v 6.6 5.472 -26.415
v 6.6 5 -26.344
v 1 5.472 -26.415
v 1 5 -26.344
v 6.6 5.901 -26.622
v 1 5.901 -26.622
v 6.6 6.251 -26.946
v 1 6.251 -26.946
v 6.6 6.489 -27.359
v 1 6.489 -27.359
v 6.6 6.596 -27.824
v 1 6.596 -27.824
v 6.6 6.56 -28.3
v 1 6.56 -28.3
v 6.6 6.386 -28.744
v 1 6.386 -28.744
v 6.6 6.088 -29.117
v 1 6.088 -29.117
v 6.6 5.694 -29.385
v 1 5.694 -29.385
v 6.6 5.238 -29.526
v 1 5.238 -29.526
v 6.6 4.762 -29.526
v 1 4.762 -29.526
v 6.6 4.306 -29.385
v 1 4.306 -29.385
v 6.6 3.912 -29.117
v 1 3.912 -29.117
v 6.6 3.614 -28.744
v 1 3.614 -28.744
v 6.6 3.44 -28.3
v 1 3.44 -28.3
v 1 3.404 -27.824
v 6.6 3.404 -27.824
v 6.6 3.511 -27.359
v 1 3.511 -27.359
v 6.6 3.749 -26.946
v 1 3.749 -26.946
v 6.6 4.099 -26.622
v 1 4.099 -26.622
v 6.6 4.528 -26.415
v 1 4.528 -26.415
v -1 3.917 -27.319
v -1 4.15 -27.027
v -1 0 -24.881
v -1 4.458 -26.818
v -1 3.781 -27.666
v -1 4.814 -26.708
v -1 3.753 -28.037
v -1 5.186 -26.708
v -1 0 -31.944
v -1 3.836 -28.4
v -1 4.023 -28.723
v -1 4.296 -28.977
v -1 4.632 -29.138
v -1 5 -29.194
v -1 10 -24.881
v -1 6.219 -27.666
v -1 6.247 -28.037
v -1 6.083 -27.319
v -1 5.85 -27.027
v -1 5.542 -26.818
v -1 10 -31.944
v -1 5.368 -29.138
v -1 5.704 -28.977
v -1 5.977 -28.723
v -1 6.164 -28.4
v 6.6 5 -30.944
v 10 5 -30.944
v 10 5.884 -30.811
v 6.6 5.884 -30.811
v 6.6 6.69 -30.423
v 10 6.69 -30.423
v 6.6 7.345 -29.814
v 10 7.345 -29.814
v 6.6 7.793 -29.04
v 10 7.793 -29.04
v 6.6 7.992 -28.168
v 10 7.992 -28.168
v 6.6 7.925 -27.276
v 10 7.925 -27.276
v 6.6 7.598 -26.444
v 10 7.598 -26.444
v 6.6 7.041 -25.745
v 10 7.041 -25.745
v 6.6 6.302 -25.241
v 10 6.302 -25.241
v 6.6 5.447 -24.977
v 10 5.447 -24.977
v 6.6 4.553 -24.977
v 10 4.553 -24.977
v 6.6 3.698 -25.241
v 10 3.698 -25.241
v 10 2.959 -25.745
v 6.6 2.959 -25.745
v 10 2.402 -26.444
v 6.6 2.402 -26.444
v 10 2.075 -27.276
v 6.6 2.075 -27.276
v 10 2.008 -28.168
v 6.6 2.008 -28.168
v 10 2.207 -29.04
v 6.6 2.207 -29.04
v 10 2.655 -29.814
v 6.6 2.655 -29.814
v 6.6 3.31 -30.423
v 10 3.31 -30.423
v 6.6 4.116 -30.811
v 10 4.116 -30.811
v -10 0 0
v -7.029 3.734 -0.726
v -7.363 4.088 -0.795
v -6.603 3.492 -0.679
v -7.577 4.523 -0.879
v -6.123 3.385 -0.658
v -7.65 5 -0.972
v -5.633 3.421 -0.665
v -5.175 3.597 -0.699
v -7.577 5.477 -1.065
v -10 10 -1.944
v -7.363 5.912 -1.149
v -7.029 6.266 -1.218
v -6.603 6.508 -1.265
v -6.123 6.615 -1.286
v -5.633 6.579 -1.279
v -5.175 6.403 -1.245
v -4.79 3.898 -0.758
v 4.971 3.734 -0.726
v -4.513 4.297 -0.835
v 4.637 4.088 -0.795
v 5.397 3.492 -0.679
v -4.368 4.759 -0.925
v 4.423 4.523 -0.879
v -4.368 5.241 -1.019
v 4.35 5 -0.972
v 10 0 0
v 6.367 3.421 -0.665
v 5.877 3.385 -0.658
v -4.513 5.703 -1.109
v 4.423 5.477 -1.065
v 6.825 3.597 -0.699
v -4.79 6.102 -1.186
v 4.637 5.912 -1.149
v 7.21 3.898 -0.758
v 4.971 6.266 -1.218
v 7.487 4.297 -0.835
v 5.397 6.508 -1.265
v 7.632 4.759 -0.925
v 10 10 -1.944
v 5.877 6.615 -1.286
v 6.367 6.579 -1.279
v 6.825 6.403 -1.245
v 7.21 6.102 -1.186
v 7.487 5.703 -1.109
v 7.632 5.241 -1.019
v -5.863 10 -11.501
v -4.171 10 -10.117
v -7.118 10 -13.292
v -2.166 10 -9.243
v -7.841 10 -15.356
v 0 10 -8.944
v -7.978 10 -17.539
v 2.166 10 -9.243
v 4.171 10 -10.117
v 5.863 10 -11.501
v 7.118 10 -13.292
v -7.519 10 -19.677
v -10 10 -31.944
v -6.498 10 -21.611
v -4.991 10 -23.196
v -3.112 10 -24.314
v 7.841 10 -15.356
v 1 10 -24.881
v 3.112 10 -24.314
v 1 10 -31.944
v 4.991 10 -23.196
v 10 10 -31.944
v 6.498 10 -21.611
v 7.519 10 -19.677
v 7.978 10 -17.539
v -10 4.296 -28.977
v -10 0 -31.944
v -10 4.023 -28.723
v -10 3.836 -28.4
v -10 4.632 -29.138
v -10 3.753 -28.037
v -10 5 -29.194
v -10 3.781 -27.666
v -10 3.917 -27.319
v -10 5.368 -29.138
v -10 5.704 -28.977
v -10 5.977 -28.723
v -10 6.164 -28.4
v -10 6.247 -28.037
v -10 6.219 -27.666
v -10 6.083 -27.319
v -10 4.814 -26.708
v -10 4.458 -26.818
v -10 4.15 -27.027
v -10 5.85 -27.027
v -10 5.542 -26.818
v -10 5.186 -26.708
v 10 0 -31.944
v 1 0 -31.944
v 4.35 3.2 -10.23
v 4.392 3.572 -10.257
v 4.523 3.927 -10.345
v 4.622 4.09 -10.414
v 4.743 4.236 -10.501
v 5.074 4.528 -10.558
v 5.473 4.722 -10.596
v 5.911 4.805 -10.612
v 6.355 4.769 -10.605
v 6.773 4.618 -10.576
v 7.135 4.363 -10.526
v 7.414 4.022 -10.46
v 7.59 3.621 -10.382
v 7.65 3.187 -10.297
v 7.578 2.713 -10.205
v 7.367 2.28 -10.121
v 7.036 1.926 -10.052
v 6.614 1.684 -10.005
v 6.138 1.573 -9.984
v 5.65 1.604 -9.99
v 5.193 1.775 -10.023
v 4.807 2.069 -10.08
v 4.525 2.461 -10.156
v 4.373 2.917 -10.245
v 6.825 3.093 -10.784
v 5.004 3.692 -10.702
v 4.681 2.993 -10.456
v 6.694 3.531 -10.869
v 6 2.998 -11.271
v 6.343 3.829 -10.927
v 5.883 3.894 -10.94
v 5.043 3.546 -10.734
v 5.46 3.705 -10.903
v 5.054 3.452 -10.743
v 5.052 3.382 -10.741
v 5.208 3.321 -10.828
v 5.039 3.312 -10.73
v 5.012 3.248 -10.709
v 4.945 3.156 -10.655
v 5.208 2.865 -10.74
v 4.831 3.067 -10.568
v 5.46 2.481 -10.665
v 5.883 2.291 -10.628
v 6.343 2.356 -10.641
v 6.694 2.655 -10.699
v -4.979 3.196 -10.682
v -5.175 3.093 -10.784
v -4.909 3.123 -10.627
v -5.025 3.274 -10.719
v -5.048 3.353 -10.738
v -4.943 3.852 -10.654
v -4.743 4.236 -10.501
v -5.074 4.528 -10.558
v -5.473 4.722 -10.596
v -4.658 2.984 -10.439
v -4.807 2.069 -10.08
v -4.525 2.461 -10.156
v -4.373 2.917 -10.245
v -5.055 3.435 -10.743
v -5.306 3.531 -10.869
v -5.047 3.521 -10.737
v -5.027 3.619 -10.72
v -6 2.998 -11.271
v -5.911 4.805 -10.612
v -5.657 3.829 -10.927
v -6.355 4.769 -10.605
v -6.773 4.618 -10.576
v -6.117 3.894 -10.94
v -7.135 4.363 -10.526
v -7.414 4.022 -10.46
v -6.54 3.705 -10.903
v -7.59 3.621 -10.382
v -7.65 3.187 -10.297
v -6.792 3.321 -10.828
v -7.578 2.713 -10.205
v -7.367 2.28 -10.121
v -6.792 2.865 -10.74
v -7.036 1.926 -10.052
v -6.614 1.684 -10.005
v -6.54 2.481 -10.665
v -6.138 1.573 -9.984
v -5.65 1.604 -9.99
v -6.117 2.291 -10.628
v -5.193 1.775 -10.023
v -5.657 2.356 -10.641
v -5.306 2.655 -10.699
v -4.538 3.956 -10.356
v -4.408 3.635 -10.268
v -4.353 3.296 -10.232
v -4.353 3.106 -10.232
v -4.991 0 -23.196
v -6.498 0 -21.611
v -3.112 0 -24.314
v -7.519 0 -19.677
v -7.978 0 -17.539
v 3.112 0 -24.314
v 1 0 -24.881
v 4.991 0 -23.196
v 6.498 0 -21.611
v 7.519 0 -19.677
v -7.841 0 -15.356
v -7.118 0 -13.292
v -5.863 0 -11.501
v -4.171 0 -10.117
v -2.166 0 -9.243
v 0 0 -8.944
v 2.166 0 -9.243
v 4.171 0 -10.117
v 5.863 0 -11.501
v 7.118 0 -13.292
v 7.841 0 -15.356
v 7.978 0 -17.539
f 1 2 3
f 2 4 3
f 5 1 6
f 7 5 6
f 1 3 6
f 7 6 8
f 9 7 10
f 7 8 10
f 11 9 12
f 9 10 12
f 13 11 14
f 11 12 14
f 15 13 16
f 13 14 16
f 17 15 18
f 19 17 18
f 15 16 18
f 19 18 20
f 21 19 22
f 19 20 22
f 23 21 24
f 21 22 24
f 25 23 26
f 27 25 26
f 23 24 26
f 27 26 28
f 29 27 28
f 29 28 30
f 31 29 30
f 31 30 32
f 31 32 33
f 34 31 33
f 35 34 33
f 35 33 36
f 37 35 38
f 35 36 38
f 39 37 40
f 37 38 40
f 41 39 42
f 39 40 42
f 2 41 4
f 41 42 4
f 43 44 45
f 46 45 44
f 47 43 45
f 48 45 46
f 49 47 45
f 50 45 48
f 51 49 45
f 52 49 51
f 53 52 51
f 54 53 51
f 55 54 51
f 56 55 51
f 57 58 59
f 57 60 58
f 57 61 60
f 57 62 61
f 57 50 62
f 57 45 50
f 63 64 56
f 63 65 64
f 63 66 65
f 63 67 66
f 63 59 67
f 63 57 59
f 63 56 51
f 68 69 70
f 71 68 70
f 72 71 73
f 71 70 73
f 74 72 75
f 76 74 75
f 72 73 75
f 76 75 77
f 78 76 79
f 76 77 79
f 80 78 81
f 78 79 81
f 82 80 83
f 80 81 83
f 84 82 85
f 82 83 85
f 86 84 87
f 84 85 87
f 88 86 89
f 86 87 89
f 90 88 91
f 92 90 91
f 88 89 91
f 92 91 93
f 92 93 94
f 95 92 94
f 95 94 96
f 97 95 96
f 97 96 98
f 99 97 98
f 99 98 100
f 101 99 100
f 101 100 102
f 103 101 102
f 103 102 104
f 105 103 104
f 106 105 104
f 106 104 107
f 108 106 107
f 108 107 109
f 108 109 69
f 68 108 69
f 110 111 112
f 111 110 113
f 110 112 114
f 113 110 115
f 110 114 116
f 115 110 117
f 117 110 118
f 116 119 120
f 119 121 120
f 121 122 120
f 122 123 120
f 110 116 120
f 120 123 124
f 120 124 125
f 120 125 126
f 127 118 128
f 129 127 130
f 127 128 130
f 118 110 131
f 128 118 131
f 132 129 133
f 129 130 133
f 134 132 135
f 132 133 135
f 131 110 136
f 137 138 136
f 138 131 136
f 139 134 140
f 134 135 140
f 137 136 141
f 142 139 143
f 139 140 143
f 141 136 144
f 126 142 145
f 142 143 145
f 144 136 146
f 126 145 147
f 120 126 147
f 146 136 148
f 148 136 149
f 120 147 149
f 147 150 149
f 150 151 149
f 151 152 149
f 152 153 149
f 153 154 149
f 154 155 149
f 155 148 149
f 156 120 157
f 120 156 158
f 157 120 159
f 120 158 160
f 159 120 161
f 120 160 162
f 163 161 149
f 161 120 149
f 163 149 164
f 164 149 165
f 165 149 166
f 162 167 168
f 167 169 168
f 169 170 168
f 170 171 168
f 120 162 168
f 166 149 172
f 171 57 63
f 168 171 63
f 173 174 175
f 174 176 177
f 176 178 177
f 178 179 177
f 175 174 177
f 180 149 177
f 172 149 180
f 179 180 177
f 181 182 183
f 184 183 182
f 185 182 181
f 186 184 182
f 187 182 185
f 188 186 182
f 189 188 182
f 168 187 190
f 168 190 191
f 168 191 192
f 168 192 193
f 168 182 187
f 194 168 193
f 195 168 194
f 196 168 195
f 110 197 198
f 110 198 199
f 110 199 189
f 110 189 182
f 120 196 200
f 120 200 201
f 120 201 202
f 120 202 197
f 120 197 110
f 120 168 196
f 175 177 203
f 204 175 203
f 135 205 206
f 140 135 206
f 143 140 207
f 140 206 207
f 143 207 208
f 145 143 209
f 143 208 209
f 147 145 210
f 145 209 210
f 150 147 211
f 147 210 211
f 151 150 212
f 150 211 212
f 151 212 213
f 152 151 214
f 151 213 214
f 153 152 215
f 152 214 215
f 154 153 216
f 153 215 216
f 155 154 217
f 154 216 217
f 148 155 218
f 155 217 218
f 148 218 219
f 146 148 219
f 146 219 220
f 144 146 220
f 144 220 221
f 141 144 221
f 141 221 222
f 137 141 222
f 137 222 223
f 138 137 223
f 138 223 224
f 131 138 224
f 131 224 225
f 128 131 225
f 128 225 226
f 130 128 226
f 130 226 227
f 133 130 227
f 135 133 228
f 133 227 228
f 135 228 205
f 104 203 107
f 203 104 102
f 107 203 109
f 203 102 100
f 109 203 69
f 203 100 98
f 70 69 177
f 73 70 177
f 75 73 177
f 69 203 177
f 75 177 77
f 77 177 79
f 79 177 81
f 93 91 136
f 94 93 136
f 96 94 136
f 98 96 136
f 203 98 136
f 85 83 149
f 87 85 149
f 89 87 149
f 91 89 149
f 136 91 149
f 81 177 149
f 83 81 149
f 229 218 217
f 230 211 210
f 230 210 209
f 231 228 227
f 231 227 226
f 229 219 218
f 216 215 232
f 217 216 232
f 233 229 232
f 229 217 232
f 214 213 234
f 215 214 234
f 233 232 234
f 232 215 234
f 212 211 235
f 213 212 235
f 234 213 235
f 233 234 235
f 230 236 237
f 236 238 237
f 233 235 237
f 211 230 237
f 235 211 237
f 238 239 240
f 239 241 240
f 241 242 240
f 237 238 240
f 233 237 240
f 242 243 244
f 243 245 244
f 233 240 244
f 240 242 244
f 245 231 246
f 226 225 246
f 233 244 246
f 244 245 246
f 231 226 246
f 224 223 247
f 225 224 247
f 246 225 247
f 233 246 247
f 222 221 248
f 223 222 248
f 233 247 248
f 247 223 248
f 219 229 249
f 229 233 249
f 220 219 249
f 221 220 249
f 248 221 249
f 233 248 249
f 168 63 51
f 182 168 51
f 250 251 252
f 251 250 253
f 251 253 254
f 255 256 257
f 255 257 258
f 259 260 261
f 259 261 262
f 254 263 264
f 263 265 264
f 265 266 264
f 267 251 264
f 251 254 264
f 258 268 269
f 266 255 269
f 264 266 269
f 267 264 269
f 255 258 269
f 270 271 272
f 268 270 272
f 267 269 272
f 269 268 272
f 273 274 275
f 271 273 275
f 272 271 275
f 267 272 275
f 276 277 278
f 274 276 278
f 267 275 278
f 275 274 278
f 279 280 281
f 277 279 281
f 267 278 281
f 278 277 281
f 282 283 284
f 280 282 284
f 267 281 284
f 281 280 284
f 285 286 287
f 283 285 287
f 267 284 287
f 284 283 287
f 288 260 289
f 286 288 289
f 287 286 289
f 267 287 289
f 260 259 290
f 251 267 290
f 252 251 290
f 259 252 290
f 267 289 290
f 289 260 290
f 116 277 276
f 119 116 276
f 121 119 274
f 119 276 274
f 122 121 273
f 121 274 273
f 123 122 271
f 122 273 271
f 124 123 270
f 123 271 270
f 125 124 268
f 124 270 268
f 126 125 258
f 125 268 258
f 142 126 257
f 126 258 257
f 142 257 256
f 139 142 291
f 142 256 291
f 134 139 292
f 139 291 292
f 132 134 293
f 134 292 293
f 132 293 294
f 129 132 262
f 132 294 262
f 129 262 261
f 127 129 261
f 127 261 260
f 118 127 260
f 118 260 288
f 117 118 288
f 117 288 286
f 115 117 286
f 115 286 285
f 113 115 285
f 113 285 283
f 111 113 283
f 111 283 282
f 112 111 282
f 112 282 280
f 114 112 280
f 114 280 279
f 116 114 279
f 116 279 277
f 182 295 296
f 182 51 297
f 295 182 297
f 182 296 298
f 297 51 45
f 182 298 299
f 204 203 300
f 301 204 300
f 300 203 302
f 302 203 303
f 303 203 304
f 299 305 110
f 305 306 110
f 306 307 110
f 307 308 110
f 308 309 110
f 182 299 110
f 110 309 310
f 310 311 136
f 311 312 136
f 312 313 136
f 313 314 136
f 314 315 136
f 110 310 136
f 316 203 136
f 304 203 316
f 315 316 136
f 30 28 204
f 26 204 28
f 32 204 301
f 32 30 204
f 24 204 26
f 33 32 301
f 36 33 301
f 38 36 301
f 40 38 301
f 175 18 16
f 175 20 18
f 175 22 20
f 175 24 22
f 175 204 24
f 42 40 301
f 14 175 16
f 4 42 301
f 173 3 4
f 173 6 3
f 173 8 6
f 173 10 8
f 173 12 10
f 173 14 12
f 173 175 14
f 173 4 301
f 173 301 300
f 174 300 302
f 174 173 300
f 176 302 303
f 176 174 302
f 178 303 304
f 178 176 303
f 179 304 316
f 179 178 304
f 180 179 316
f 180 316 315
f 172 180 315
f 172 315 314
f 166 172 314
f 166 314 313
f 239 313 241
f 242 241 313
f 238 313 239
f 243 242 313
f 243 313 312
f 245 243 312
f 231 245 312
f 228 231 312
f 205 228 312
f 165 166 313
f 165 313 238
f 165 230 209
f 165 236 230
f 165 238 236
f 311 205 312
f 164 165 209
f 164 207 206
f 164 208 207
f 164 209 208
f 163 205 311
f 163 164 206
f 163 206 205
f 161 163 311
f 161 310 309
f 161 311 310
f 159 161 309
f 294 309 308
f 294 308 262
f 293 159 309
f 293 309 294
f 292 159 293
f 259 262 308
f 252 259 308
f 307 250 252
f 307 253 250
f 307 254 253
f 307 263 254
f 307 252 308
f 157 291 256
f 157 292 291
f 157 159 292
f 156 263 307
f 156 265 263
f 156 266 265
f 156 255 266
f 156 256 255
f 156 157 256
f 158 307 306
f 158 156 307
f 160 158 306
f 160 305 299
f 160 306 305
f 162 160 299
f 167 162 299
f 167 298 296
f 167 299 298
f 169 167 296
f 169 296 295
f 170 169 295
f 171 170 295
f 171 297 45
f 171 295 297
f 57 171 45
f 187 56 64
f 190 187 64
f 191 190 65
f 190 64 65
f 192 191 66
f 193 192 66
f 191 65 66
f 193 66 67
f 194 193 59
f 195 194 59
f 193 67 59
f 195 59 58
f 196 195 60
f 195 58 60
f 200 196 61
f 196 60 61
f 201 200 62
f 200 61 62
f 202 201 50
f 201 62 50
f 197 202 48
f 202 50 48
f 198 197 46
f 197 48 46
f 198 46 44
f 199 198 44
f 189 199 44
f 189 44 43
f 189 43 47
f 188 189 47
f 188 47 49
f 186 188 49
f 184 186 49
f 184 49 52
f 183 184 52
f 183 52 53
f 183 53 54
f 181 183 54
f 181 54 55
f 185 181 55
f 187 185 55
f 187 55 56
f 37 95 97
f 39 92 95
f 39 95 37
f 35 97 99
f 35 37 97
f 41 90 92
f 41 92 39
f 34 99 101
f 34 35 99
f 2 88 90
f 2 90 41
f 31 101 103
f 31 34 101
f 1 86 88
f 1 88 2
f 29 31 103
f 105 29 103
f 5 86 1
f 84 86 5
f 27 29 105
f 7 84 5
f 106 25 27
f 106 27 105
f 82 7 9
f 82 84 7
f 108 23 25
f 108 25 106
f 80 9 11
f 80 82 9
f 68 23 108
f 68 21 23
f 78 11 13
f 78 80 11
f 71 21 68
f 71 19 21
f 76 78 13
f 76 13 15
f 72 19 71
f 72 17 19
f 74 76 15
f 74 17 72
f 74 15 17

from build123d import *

# Parameters (mm, degrees)
EXTRUDE_1_DEPTH           = 10
CUT_EXTRUDE_1_DEPTH       = 35.93431774
HOLE_WIZARD_M4_1_D        = 3.3
HOLE_WIZARD_M4_1_DEPTH    = 9.5
HOLE_WIZARD_M4_1_TIP      = 0.991420021
HOLE_WIZARD_2_D           = 3.2
HOLE_WIZARD_2_DEPTH       = 10
HOLE_WIZARD_2_CBORE_D     = 6
HOLE_WIZARD_2_CBORE_DEPTH = 3.4
HOLE_WIZARD_2_TIP         = 0.96137699
HOLE_WIZARD_M3_1_D        = 2.5


with BuildPart() as part:
    # 草图1 → 凸台-拉伸1 (new, symmetric)
    with BuildSketch(Plane(origin=(0, 0, 0), x_dir=(0, 0, -1), z_dir=(1, 0, 0))):
        Polygon((0, 0), (1.943803091, 10), (31.943803091, 10), (31.943803091, 0), align=None)
    extrude(amount=EXTRUDE_1_DEPTH, both=True)

    # 草图2 → 切除-拉伸1 (cut, through all)
    with BuildSketch(Plane(origin=(0, 10, 0), x_dir=(1, 0, 0), z_dir=(0, 1, 0))):
        with BuildLine():
            Line((-1, 31.943803091), (1, 31.943803091))
            Line((1, 31.943803091), (1, 24.881057025))
            ThreePointArc((1, 24.881057025), (0, 8.943803091), (-1, 24.881057025))
            Line((-1, 24.881057025), (-1, 31.943803091))
        make_face()
    extrude(amount=-CUT_EXTRUDE_1_DEPTH, mode=Mode.SUBTRACT)

    # M4 螺纹孔1
    with Locations(Plane(origin=(0, 0, 0), x_dir=(1, 0, 0), z_dir=(0, 0.19080899537654164, 0.9816271834476646))):
        with Locations((-6, 5.093583475), (6, 5.093583475)):
            Hole(HOLE_WIZARD_M4_1_D / 2, depth=HOLE_WIZARD_M4_1_DEPTH)
            with Locations((0, 0, -(HOLE_WIZARD_M4_1_DEPTH + HOLE_WIZARD_M4_1_TIP / 2))):  # 118° drill point
                Cone(0, HOLE_WIZARD_M4_1_D / 2, HOLE_WIZARD_M4_1_TIP, mode=Mode.SUBTRACT)

    # 打孔尺寸(%根据)内六角圆柱头螺钉的类型2
    with Locations(Plane(origin=(10, 0, 0), x_dir=(0, 0, -1), z_dir=(1, 0, 0))):
        with Locations((27.943803091, 5)):
            CounterBoreHole(HOLE_WIZARD_2_D / 2, HOLE_WIZARD_2_CBORE_D / 2, HOLE_WIZARD_2_CBORE_DEPTH, depth=HOLE_WIZARD_2_DEPTH)
            with Locations((0, 0, -(HOLE_WIZARD_2_DEPTH + HOLE_WIZARD_2_TIP / 2))):  # 118° drill point
                Cone(0, HOLE_WIZARD_2_D / 2, HOLE_WIZARD_2_TIP, mode=Mode.SUBTRACT)

    # M3 螺纹孔1 (through all)
    with Locations(Plane.ZY.offset(10)):
        with Locations((-27.943803091, 5)):
            Hole(HOLE_WIZARD_M3_1_D / 2)


solid = part.part
